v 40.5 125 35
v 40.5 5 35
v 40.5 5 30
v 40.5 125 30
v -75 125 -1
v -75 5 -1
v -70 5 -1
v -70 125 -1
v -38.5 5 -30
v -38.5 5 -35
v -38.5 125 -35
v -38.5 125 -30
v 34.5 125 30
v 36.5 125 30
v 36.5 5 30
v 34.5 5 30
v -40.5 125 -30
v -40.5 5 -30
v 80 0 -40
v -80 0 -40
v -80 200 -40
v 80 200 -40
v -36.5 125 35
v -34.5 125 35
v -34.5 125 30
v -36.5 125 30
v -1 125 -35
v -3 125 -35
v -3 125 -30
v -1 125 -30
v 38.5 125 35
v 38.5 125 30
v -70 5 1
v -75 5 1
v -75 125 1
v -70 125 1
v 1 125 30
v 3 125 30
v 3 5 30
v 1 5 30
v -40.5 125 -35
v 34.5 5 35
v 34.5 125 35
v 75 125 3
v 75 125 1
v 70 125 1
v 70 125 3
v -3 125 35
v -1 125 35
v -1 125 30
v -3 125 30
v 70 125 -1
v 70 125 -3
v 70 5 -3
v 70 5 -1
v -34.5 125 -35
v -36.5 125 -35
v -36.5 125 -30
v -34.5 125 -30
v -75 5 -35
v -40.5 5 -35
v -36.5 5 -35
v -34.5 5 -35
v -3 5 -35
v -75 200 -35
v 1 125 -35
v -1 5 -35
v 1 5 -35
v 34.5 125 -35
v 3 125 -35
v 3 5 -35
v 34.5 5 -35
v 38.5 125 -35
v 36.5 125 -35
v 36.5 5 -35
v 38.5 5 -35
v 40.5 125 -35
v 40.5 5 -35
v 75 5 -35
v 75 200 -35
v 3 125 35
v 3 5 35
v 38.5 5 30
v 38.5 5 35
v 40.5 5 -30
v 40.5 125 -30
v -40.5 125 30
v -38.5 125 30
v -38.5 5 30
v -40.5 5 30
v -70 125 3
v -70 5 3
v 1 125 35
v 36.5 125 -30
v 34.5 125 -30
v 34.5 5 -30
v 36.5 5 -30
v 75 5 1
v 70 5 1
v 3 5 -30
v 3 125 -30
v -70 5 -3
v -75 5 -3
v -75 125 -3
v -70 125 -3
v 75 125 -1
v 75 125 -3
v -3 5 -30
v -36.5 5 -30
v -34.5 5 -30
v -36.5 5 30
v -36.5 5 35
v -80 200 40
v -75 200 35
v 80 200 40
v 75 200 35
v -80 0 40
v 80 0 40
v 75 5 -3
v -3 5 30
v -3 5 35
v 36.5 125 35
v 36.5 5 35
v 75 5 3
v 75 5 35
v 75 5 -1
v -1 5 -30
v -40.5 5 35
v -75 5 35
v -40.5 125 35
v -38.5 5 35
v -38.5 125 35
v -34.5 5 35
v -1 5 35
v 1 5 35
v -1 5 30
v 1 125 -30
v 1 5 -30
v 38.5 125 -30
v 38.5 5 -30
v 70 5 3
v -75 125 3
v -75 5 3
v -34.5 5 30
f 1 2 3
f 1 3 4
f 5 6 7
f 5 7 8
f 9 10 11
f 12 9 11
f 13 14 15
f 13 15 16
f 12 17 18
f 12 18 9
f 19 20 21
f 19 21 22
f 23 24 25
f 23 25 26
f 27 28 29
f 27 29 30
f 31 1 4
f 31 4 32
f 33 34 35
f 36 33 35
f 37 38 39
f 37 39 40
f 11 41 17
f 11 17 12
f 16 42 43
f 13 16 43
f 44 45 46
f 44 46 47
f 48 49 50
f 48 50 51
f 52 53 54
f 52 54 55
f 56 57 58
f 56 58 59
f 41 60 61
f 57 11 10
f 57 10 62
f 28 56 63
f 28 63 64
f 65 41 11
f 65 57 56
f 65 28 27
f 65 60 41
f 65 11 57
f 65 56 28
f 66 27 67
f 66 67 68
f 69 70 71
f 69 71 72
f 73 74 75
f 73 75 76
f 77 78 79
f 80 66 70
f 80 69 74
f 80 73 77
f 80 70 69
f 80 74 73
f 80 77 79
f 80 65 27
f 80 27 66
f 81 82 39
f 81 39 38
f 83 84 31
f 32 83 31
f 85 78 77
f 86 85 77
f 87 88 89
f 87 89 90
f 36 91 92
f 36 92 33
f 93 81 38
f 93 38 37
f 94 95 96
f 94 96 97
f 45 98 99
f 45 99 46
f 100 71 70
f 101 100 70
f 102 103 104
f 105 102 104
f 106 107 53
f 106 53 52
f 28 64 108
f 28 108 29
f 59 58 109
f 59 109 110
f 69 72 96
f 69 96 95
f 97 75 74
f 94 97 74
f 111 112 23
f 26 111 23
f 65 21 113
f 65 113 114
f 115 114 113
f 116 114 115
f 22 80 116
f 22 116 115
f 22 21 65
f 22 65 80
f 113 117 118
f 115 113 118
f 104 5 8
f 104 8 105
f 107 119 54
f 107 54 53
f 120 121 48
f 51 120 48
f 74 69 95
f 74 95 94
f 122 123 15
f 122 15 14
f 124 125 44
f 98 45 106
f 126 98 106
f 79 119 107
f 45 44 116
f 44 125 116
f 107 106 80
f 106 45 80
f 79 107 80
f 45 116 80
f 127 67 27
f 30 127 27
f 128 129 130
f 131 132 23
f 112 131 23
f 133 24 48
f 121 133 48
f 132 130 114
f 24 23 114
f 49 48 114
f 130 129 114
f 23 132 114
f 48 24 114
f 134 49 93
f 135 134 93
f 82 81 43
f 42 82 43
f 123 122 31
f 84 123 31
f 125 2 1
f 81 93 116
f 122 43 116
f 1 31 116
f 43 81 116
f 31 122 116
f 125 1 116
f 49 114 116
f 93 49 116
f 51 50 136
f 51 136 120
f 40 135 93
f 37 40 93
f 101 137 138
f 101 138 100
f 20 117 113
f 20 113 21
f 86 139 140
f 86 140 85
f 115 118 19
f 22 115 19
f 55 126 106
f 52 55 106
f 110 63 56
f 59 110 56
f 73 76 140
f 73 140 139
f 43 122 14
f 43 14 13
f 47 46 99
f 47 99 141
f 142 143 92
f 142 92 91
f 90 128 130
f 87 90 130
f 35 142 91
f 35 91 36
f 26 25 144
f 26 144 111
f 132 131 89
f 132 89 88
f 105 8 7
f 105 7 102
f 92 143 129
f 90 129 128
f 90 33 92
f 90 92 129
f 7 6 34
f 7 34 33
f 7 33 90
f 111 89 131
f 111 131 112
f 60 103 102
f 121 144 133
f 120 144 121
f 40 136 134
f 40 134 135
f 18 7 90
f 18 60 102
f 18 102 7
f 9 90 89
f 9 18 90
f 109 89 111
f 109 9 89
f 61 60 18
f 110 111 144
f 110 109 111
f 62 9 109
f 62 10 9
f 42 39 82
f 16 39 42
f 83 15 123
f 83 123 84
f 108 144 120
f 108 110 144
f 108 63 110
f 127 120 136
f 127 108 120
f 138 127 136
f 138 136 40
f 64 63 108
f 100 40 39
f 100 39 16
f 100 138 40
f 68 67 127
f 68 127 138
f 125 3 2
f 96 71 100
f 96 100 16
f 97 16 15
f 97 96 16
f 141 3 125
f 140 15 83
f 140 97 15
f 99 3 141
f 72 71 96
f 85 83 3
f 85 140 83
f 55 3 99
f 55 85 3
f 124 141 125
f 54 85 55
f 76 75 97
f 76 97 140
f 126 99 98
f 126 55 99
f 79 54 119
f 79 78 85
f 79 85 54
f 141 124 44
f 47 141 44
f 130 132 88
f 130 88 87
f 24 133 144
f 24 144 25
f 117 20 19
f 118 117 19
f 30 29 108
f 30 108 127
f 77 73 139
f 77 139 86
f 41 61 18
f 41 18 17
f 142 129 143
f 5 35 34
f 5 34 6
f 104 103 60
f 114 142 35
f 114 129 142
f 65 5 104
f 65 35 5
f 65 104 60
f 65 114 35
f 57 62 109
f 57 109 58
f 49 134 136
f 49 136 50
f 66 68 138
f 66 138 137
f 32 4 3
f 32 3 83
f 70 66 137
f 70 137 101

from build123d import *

# Parameters (mm, degrees)
SKETCH1_W           = 160
SKETCH1_H           = 80
BOSS_EXTRUDE1_DEPTH = 225
SKETCH2_W           = 150
SKETCH2_H           = 70
CUT_EXTRUDE1_DEPTH  = 220
SKETCH7_W           = 2
SKETCH7_H           = 120
BOSS_EXTRUDE2_DEPTH = 5
SKETCH8_W           = 2
SKETCH8_H           = 120
BOSS_EXTRUDE3_DEPTH = 5
SKETCH9_W           = 2
SKETCH9_H           = 120
BOSS_EXTRUDE4_DEPTH = 5
SKETCH10_W          = 2
SKETCH10_H          = 120
BOSS_EXTRUDE5_DEPTH = 5
SKETCH11_W          = 160
SKETCH11_H          = 80
SKETCH11_W_2        = 150
SKETCH11_H_2        = 70
CUT_EXTRUDE2_DEPTH  = 25


with BuildPart() as part:
    # Sketch1 → Boss-Extrude1 (new body)
    with BuildSketch(Plane(origin=(0, 0, 0), x_dir=(1, 0, 0), z_dir=(0, 1, 0))):
        Rectangle(SKETCH1_W, SKETCH1_H)
    extrude(amount=BOSS_EXTRUDE1_DEPTH)

    # Sketch2 → Cut-Extrude1 (cut)
    with BuildSketch(Plane(origin=(0, 225, 0), x_dir=(1, 0, 0), z_dir=(0, 1, 0))):
        Rectangle(SKETCH2_W, SKETCH2_H)
    extrude(amount=-CUT_EXTRUDE1_DEPTH, mode=Mode.SUBTRACT)

    # Sketch7 → Boss-Extrude2 (add)
    with BuildSketch(Plane(origin=(0, 0, 35), x_dir=(-1, 0, 0), z_dir=(0, 0, -1))):
        with Locations((-39.5, 65)):
            Rectangle(SKETCH7_W, SKETCH7_H)
        with Locations((-35.5, 65)):
            Rectangle(SKETCH7_W, SKETCH7_H)
        with Locations((-2, 65)):
            Rectangle(SKETCH7_W, SKETCH7_H)
        with Locations((2, 65)):
            Rectangle(SKETCH7_W, SKETCH7_H)
        with Locations((35.5, 65)):
            Rectangle(SKETCH7_W, SKETCH7_H)
        with Locations((39.5, 65)):
            Rectangle(SKETCH7_W, SKETCH7_H)
    extrude(amount=BOSS_EXTRUDE2_DEPTH)

    # Sketch8 → Boss-Extrude3 (add)
    with BuildSketch(Plane.XY.offset(-35)):
        with Locations((-39.5, 65)):
            Rectangle(SKETCH8_W, SKETCH8_H)
        with Locations((-35.5, 65)):
            Rectangle(SKETCH8_W, SKETCH8_H)
        with Locations((-2, 65)):
            Rectangle(SKETCH8_W, SKETCH8_H)
        with Locations((2, 65)):
            Rectangle(SKETCH8_W, SKETCH8_H)
        with Locations((35.5, 65)):
            Rectangle(SKETCH8_W, SKETCH8_H)
        with Locations((39.5, 65)):
            Rectangle(SKETCH8_W, SKETCH8_H)
    extrude(amount=BOSS_EXTRUDE3_DEPTH)

    # Sketch9 → Boss-Extrude4 (add)
    with BuildSketch(Plane(origin=(-75, 0, 0), x_dir=(0, 0, -1), z_dir=(1, 0, 0))):
        with Locations((-2, 65)):
            Rectangle(SKETCH9_W, SKETCH9_H)
        with Locations((2, 65)):
            Rectangle(SKETCH9_W, SKETCH9_H)
    extrude(amount=BOSS_EXTRUDE4_DEPTH)

    # Sketch10 → Boss-Extrude5 (add)
    with BuildSketch(Plane.ZY.offset(-75)):
        with Locations((-2, 65)):
            Rectangle(SKETCH10_W, SKETCH10_H)
        with Locations((2, 65)):
            Rectangle(SKETCH10_W, SKETCH10_H)
    extrude(amount=BOSS_EXTRUDE5_DEPTH)

    # Sketch11 → Cut-Extrude2 (cut)
    with BuildSketch(Plane(origin=(0, 225, 0), x_dir=(1, 0, 0), z_dir=(0, 1, 0))):
        Rectangle(SKETCH11_W, SKETCH11_H)
        Rectangle(SKETCH11_W_2, SKETCH11_H_2, mode=Mode.SUBTRACT)
    extrude(amount=-CUT_EXTRUDE2_DEPTH, mode=Mode.SUBTRACT)


solid = part.part
